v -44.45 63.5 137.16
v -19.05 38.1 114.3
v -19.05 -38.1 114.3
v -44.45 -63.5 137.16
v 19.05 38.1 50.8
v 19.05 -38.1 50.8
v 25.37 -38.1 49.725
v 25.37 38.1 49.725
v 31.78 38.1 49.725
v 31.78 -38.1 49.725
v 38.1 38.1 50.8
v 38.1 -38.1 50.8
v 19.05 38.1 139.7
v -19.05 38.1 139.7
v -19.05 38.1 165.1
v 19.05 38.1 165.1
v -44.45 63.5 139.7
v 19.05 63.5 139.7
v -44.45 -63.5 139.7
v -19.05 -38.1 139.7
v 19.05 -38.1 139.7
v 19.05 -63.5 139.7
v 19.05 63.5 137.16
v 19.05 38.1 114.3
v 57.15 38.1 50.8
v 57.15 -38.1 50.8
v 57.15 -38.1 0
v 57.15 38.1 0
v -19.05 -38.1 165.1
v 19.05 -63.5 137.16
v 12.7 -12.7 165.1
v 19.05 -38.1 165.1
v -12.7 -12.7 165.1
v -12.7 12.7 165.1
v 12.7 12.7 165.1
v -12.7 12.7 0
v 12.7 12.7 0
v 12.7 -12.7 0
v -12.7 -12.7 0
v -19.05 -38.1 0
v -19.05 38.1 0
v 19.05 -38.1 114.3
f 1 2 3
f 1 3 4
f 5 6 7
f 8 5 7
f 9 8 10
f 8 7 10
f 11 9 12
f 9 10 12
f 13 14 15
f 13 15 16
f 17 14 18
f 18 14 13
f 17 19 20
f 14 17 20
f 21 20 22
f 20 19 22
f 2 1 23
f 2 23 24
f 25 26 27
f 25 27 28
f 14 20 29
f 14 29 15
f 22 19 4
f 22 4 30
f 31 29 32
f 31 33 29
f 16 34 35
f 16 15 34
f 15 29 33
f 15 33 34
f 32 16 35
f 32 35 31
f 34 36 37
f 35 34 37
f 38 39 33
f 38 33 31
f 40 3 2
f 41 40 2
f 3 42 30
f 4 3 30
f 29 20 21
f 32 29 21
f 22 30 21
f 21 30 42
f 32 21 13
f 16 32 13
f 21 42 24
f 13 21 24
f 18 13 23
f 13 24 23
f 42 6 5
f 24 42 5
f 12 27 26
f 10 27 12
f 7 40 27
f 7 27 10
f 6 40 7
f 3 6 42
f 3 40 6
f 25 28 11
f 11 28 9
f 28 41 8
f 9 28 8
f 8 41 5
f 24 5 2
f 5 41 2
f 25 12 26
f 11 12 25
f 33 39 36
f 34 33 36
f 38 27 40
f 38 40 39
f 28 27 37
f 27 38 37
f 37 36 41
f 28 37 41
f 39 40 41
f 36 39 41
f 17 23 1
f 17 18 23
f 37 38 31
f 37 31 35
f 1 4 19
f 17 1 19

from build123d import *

# Parameters (mm, degrees)
F0_W      = 38.1
F0_H      = 76.2
F1_DEPTH  = 177.8
F2_W      = 76.2
F2_H      = 25.4
F3_DEPTH  = 25.4
F5_DEPTH  = 25.4
F7_DEPTH  = 25.4
F9_DEPTH  = 228.6
F11_DEPTH = 228.6
F12_W     = 38.1
F12_H     = 76.2
F13_DEPTH = 25.4
F14_W     = 25.4
F14_H     = 25.4
F15_DEPTH = 228.6
F16_W     = 76.2
F16_H     = 50.8
F17_DEPTH = 38.1
F19_DEPTH = 228.6
F20_W     = 38.1
F20_H     = 76.2
F20_W_2   = 25.4
F20_H_2   = 25.4
F21_DEPTH = 38.1


with BuildPart() as f1:
    # F0 (on Top) → F1 (new body)
    with BuildSketch(Plane.XY):
        Rectangle(F0_W, F0_H)
    extrude(amount=F1_DEPTH)

    # F2 (on face) → F3 (join)
    with BuildSketch(Plane(origin=(-19.05, 0, 0), x_dir=(0, -1, 0), z_dir=(-1, 0, 0))):
        with Locations((0, 127)):
            Rectangle(F2_W, F2_H)
    extrude(amount=F3_DEPTH)

    # F4 (on face) → F5 (join)
    with BuildSketch(Plane.XZ.offset(38.1)):
        Polygon((-44.45, 139.7), (-44.45, 114.3), (-19.05, 114.3), (19.05, 114.3), (19.05, 139.7), (-19.05, 139.7), align=None)
    extrude(amount=F5_DEPTH)

    # F6 (on face) → F7 (join)
    with BuildSketch(Plane(origin=(0, 38.1, 0), x_dir=(-1, 0, 0), z_dir=(0, 1, 0))):
        Polygon((44.45, 114.3), (44.45, 139.7), (19.05, 139.7), (-19.05, 139.7), (-19.05, 114.3), (19.05, 114.3), align=None)
    extrude(amount=F7_DEPTH)

    # F8 (on face) → F9 (cut)
    with BuildSketch(Plane.YZ.offset(19.05)):
        Polygon((-38.1, 114.3), (-63.5, 137.16), (-63.5, 114.3), align=None)
        Polygon((63.5, 137.16), (38.1, 114.3), (63.5, 114.3), align=None)
    extrude(amount=-F9_DEPTH, mode=Mode.SUBTRACT)

    # F10 (on face) → F11 (cut)
    with BuildSketch(Plane.XZ.offset(63.5)):
        Polygon((-19.05, 114.3), (-44.45, 137.16), (-44.45, 114.3), align=None)
    extrude(amount=-F11_DEPTH, mode=Mode.SUBTRACT)

    # F12 (on face) → F13 (join)
    with BuildSketch(Plane.XY.offset(177.8)):
        Rectangle(F12_W, F12_H)
    extrude(amount=F13_DEPTH)

    # F14 (on face) → F15 (cut)
    with BuildSketch(Plane.XY.offset(203.2)):
        Rectangle(F14_W, F14_H)
    extrude(amount=-F15_DEPTH, mode=Mode.SUBTRACT)

    # F16 (on face) → F17 (join)
    with BuildSketch(Plane.YZ.offset(19.05)):
        with Locations((0, 25.4)):
            Rectangle(F16_W, F16_H)
    extrude(amount=F17_DEPTH)

    # F18 (on face) → F19 (cut)
    with BuildSketch(Plane.XZ.offset(38.1)):
        with BuildLine():
            Line((38.1, 50.8), (19.05, 50.8))
            ThreePointArc((19.05, 50.8), (28.575, 49.5901663726), (38.1, 50.8))
        make_face()
    extrude(amount=-F19_DEPTH, mode=Mode.SUBTRACT)

    # F20 (on face) → F21 (cut)
    with BuildSketch(Plane.XY.offset(203.2)):
        Rectangle(F20_W, F20_H)
        Rectangle(F20_W_2, F20_H_2, mode=Mode.SUBTRACT)
    extrude(amount=-F21_DEPTH, mode=Mode.SUBTRACT)


solid = f1.part
